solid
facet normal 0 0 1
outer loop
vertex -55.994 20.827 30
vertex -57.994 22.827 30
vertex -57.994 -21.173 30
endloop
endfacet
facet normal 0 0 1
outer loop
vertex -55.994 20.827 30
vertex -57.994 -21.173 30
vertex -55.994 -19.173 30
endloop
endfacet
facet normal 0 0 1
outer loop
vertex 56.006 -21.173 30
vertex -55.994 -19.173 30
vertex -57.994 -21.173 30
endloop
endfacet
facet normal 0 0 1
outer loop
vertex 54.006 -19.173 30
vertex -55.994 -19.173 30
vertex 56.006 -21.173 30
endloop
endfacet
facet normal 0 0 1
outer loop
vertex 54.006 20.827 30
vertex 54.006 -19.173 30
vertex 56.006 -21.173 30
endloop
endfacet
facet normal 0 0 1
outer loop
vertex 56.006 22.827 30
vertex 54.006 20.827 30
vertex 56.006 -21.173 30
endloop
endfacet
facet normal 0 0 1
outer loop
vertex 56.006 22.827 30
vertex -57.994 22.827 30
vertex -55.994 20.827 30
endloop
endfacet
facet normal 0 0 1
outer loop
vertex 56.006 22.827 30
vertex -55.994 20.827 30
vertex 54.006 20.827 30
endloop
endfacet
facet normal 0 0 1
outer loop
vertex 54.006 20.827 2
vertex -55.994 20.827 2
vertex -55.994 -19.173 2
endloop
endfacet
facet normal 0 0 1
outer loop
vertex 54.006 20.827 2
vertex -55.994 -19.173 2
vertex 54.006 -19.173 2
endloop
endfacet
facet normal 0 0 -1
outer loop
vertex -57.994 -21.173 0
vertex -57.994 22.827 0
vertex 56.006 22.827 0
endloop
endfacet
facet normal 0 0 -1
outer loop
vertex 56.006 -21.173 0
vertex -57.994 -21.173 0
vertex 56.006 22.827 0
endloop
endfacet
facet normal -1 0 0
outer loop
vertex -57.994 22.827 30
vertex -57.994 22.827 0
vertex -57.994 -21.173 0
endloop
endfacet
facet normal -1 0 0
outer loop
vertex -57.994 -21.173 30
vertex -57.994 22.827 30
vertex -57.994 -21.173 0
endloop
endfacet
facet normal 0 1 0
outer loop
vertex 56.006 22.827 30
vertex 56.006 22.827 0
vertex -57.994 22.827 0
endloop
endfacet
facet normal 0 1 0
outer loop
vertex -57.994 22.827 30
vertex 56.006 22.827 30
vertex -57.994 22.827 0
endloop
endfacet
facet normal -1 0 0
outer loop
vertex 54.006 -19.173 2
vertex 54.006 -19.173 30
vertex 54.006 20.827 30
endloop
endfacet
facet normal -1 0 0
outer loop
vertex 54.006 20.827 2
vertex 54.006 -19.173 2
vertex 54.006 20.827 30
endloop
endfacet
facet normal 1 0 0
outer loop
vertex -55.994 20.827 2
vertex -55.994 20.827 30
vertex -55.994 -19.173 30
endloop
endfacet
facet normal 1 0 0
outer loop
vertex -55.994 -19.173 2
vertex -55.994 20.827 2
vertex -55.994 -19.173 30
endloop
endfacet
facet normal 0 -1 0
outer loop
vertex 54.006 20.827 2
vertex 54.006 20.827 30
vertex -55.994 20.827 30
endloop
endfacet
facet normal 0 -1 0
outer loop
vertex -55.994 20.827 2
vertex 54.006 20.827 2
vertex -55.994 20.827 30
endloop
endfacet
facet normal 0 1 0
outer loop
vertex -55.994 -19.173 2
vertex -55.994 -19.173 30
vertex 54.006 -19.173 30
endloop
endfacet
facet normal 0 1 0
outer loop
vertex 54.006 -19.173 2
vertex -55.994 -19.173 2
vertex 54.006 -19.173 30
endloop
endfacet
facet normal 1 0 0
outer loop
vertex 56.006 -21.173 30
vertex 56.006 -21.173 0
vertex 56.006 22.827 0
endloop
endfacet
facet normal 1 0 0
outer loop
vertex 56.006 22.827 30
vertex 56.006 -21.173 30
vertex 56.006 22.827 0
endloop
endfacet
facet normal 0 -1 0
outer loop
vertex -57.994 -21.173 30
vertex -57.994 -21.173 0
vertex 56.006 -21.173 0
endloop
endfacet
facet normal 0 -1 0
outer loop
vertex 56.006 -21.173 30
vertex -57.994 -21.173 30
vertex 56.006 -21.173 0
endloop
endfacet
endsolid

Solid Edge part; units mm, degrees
sketch "Sketch1" plane through (0, 0, 0) normal (0, 0, 1) x (1, 0, 0)
  line L0 (-57.9945, -21.1726) -> (56.0055, -21.1726)
  line L1 (56.0055, -21.1726) -> (56.0055, 22.8274)
  line L2 (56.0055, 22.8274) -> (-57.9945, 22.8274)
  line L3 (-57.9945, 22.8274) -> (-57.9945, -21.1726)
extrude "Protrusion1" add sketch "Sketch1" along normal blind 30
sketch "Sketch2" plane through (-0.9945, 0.8274, 30) normal (0, 0, 1) x (1, 0, 0)
  line L0 (-55, -20) -> (55, -20)
  line L1 (55, -20) -> (55, 20)
  line L2 (55, 20) -> (-55, 20)
  line L3 (-55, 20) -> (-55, -20)
extrude "ExtrudedCutout_1" cut sketch "Sketch2" against normal blind 28
